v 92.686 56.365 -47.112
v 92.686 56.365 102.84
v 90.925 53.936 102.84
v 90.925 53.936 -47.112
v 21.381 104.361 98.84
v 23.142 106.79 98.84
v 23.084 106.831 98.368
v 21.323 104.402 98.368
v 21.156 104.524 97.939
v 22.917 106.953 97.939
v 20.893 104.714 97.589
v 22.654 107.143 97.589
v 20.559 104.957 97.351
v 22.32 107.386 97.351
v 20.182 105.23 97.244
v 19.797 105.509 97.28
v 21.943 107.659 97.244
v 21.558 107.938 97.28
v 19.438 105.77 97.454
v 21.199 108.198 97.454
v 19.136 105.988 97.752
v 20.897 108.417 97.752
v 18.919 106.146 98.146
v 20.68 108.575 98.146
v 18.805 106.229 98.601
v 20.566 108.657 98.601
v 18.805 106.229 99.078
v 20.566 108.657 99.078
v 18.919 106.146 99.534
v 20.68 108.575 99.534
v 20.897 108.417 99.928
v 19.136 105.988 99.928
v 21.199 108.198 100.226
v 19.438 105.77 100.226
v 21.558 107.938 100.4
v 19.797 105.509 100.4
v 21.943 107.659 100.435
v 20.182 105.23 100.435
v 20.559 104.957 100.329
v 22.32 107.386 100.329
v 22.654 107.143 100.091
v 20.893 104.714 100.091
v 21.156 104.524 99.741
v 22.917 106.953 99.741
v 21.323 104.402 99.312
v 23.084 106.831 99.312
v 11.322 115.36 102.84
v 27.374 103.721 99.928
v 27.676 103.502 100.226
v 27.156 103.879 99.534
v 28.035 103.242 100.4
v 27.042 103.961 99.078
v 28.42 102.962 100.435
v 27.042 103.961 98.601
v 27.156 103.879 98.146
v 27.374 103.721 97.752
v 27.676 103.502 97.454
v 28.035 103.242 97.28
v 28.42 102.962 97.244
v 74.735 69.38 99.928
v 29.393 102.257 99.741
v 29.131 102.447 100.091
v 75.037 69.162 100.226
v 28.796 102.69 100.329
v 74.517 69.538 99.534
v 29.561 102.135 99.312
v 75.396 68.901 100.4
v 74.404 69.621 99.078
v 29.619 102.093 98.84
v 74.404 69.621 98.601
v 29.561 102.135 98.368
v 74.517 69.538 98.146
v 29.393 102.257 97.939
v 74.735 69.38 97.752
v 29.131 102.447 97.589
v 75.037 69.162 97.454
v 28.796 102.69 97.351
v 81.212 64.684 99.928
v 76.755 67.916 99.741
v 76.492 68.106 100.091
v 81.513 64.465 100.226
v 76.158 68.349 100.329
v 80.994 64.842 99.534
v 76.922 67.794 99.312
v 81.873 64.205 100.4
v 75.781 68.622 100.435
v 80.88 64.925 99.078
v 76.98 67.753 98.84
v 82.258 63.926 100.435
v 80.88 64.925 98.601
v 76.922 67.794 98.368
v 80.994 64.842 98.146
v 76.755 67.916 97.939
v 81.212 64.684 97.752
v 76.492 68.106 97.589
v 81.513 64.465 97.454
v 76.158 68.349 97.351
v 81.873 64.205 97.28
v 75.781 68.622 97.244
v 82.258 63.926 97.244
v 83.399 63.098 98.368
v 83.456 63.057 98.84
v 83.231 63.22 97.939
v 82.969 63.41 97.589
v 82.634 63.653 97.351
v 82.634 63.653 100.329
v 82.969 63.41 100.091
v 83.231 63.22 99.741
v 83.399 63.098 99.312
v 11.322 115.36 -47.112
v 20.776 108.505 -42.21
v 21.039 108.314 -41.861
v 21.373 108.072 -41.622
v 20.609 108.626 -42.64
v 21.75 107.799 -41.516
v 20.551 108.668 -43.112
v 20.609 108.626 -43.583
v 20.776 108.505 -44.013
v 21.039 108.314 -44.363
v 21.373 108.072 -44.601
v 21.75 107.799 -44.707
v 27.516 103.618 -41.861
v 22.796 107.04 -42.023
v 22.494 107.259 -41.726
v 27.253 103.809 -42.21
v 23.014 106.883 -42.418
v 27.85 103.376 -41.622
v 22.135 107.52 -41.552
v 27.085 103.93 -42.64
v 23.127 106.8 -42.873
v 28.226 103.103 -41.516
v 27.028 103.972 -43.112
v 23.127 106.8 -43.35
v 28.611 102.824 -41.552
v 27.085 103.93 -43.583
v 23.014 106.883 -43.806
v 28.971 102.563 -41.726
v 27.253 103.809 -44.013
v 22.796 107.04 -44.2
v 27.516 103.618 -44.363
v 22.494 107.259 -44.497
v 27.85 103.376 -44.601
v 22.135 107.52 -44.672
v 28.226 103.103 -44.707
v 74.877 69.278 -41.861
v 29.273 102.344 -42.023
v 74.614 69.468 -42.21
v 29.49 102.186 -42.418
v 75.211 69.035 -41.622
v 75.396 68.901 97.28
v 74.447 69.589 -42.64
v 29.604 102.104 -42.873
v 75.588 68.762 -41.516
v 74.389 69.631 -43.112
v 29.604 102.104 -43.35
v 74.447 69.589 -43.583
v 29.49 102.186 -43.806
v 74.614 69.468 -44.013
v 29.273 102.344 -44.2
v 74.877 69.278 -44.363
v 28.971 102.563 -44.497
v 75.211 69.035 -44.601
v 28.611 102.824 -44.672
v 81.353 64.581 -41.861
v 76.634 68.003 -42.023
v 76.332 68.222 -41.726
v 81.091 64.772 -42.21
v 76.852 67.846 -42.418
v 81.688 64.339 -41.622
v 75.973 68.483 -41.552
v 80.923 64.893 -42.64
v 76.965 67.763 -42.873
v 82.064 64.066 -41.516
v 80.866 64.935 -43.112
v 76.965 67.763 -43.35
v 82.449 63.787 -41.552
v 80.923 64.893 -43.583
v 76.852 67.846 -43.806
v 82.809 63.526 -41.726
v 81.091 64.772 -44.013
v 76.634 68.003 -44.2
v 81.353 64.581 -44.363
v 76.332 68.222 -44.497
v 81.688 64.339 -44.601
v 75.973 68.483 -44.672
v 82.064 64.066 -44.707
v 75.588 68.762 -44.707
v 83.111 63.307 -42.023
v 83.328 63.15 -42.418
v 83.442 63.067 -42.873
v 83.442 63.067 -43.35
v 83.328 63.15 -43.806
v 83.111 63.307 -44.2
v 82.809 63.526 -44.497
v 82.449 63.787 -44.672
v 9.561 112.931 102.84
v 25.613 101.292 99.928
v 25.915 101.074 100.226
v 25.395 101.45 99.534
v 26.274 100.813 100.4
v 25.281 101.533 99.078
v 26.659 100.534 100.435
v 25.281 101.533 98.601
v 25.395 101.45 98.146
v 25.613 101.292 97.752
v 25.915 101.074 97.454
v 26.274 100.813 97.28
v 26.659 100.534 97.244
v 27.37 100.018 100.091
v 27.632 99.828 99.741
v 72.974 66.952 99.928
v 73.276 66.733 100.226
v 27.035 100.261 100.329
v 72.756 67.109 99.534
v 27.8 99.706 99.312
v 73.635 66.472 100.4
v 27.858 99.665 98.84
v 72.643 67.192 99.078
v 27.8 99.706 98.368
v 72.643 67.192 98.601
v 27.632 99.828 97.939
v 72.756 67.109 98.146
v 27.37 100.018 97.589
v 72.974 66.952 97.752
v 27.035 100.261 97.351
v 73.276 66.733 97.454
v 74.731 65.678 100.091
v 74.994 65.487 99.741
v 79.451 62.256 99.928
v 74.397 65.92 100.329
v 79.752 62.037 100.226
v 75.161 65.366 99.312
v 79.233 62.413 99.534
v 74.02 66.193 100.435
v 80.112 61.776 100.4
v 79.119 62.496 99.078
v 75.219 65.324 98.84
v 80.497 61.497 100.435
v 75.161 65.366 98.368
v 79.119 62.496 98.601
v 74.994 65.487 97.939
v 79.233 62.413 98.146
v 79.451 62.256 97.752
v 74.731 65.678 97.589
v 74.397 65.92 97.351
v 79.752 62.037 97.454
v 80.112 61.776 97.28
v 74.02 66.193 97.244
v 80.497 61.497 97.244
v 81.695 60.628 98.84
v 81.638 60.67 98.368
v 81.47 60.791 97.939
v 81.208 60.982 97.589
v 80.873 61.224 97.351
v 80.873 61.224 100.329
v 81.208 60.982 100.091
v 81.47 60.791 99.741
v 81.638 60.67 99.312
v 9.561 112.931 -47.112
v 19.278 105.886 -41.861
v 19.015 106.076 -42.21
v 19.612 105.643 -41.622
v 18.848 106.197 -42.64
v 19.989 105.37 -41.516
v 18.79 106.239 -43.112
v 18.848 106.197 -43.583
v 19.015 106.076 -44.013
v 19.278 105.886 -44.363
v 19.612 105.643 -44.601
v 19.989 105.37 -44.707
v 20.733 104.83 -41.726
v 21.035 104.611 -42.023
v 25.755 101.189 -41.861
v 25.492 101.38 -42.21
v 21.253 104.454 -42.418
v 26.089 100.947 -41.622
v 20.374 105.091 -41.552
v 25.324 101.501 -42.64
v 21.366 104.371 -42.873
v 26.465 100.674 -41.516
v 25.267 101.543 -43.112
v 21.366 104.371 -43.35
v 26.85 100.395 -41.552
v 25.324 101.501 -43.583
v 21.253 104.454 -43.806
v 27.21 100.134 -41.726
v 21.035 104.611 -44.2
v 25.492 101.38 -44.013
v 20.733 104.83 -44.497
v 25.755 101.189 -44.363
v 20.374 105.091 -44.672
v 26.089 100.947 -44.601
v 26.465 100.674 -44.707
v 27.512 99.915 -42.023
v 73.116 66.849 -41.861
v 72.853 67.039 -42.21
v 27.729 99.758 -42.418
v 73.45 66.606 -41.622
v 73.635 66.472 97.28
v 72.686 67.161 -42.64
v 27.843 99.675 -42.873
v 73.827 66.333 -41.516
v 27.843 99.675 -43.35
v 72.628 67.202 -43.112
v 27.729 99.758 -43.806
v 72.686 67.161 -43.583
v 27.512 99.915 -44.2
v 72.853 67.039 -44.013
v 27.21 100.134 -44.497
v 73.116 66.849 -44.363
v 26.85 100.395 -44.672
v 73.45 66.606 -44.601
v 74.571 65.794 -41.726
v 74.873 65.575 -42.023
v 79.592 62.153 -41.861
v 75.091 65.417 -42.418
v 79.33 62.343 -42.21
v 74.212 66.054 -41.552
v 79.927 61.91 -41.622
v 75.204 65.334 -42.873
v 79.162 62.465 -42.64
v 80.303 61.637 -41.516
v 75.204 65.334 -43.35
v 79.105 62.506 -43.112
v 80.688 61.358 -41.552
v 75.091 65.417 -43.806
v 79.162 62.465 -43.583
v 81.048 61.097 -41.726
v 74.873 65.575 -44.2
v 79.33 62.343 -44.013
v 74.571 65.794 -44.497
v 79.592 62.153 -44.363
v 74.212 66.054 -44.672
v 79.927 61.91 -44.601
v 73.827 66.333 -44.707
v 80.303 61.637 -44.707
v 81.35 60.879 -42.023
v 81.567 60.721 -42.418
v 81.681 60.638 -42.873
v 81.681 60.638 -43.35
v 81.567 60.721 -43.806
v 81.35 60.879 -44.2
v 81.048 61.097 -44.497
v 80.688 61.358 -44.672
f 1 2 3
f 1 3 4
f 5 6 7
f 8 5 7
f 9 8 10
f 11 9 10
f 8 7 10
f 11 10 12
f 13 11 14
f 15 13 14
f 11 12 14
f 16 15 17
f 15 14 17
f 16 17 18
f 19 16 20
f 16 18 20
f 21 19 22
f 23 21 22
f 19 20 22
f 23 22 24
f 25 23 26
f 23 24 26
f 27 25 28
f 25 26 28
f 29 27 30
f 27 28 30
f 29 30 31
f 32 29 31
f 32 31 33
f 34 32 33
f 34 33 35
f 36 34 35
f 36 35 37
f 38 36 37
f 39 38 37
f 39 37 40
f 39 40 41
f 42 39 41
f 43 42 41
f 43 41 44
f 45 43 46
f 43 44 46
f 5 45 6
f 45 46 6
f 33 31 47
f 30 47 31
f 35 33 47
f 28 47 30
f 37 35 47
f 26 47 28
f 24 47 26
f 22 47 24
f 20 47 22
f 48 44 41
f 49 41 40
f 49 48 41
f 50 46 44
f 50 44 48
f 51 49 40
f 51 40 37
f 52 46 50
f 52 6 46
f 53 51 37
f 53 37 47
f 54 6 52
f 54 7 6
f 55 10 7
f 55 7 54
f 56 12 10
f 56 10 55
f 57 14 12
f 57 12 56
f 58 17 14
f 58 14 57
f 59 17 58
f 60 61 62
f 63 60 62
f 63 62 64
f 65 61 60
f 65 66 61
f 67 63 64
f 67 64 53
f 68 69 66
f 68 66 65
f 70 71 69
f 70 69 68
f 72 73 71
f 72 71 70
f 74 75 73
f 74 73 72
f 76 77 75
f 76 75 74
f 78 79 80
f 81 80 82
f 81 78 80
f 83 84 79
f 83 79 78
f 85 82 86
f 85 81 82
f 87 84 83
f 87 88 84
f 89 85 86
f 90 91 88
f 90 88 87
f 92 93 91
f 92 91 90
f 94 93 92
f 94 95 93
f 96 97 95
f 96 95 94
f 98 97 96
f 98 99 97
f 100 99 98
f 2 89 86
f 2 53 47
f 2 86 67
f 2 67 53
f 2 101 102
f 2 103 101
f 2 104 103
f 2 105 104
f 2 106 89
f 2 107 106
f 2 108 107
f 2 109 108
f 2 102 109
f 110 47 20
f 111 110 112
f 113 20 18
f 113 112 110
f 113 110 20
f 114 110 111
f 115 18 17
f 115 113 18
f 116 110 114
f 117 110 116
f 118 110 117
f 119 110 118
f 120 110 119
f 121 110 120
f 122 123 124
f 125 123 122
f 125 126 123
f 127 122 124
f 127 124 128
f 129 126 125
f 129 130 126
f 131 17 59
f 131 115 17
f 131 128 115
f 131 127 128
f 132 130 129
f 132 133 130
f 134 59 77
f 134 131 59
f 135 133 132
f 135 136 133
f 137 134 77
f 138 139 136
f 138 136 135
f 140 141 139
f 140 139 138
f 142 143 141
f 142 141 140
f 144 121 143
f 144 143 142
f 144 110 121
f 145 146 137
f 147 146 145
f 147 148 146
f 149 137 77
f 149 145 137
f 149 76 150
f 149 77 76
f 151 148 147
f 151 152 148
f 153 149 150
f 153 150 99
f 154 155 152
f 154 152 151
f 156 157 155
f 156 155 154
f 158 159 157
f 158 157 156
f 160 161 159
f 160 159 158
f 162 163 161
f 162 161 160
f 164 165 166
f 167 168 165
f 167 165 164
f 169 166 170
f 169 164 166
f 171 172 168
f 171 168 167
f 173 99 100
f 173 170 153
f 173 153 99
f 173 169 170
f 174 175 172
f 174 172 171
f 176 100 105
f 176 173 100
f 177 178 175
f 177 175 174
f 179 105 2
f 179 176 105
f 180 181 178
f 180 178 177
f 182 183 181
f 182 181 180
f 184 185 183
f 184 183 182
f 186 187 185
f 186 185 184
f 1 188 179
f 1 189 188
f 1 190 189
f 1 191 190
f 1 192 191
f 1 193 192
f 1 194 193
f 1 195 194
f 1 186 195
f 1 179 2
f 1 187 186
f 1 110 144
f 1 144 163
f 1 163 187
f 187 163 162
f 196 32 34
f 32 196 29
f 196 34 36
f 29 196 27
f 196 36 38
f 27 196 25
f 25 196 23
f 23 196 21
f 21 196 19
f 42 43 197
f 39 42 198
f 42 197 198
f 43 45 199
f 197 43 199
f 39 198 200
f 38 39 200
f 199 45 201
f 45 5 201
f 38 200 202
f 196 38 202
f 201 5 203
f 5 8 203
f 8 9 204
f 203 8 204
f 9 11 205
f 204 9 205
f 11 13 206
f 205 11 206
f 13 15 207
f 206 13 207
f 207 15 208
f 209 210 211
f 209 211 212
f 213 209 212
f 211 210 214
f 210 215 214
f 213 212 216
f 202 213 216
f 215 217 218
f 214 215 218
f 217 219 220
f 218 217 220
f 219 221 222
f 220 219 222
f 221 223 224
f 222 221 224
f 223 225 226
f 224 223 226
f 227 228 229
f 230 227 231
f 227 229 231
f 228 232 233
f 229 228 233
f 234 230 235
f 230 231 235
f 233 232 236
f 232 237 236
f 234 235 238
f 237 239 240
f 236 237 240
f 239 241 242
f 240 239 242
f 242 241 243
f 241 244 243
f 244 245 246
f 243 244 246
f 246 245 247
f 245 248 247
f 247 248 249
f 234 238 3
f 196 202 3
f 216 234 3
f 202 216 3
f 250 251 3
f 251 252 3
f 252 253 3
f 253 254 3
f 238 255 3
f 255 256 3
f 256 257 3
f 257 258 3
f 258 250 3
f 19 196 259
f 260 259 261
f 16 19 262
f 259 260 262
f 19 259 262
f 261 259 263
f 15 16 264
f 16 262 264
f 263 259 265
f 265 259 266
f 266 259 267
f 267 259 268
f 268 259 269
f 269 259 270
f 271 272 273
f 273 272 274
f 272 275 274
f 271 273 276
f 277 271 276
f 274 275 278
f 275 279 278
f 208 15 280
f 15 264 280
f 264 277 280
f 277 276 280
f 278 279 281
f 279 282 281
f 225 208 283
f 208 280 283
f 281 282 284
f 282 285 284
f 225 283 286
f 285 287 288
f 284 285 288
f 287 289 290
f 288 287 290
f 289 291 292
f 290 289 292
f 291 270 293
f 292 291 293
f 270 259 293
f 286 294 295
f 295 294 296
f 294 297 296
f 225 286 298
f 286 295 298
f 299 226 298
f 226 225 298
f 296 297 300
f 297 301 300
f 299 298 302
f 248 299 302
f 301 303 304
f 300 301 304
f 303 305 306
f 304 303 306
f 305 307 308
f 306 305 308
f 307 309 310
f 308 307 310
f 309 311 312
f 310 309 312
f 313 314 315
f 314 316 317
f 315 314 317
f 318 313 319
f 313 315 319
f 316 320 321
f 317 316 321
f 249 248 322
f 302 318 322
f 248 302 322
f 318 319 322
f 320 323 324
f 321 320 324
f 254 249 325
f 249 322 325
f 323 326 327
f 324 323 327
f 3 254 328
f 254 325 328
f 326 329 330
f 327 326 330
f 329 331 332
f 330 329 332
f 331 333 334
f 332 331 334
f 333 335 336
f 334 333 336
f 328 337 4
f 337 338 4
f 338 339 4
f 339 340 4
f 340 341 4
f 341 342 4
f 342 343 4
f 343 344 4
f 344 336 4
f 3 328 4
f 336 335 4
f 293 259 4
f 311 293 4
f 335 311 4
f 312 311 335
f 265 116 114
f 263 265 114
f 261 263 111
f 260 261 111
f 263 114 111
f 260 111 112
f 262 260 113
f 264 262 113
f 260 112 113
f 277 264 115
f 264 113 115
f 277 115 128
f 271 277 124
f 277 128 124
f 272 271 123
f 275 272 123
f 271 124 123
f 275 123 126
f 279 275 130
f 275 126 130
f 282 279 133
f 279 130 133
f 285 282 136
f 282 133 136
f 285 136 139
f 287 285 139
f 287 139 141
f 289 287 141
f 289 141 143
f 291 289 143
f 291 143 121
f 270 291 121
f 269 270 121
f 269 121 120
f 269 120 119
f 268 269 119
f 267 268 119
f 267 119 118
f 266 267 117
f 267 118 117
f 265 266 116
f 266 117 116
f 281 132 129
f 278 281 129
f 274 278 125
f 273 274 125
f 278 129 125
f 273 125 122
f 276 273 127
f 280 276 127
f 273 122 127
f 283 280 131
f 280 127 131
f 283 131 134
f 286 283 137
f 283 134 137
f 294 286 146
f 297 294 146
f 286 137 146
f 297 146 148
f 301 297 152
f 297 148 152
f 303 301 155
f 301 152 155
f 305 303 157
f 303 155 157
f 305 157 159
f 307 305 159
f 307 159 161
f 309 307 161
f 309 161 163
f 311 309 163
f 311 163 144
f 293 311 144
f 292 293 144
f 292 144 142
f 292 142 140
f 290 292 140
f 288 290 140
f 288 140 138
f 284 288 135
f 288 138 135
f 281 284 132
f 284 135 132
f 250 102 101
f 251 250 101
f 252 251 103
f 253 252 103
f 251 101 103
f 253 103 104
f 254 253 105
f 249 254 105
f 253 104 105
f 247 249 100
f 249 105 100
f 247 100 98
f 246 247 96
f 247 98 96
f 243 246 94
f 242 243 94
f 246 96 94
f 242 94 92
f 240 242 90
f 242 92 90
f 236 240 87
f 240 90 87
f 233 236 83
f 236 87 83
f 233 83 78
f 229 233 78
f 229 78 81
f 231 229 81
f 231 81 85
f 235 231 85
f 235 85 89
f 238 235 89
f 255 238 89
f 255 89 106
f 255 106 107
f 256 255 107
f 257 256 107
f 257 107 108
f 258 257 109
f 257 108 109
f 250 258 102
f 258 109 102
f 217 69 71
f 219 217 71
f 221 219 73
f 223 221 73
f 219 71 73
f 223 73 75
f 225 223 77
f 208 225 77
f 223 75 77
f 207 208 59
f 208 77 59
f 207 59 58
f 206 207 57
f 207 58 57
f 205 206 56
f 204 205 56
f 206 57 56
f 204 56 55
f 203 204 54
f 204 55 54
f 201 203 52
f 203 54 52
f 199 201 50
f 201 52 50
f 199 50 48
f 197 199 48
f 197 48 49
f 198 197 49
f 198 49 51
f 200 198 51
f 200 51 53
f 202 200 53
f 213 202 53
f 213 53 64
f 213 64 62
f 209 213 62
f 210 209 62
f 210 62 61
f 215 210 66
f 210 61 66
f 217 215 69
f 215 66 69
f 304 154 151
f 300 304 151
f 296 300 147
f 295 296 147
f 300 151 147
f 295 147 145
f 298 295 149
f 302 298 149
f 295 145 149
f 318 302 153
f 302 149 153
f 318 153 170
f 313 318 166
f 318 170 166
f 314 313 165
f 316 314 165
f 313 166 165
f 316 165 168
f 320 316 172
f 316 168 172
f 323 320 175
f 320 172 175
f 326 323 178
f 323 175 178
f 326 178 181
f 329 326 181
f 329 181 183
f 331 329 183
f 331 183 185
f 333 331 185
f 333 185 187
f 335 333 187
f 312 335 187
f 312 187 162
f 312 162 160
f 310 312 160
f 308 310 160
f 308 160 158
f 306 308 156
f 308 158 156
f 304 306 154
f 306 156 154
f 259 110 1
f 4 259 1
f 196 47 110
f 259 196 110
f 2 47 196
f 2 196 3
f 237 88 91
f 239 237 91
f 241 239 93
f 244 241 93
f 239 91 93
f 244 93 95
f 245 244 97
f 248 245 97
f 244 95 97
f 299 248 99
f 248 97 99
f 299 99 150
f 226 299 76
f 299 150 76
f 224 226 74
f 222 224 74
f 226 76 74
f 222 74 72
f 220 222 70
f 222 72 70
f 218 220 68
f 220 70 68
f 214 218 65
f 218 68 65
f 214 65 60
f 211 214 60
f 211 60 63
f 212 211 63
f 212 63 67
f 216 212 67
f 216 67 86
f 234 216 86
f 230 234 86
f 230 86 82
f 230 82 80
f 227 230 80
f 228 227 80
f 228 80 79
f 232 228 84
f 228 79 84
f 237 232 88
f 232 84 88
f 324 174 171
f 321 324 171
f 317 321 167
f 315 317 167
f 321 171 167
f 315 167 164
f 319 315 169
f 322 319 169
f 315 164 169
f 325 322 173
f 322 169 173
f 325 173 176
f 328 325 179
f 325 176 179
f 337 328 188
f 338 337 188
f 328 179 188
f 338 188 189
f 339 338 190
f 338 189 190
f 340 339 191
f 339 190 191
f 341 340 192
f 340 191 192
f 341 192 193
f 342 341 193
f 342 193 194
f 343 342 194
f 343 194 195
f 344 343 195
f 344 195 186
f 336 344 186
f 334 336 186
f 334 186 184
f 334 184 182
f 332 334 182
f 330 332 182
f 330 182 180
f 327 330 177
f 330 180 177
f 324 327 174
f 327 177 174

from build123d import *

# Parameters (mm, degrees)
SKETCH_2_W      = 100.501056251
SKETCH_2_H      = 149.951645819
SKETCH_2_R      = 1.6
EXTRUDE_1_DEPTH = 3


with BuildPart() as part:
    # 草图2 → 凸台-拉伸1 (new body)
    with BuildSketch(Plane(origin=(58.724000156, 80.989637793, 0), x_dir=(0.8095795047809408, -0.5870102430440604, 0), z_dir=(0.5870102430440604, 0.8095795047809408, 0))):
        with Locations((-8.300782896, -27.864106314)):
            Rectangle(SKETCH_2_W, SKETCH_2_H)
        with Locations(Location((-45.551311022, 43.111716595, 0), (0, 0, 180))):
            Circle(SKETCH_2_R, mode=Mode.SUBTRACT)
        with Locations(Location((-37.551311022, 43.111716595, 0), (0, 0, 180))):
            Circle(SKETCH_2_R, mode=Mode.SUBTRACT)
        with Locations(Location((20.949745229, 43.111716595, 0), (0, 0, 180))):
            Circle(SKETCH_2_R, mode=Mode.SUBTRACT)
        with Locations(Location((28.949745229, 43.111716595, 0), (0, 0, 180))):
            Circle(SKETCH_2_R, mode=Mode.SUBTRACT)
        with Locations((28.949745229, -98.839929224)):
            Circle(SKETCH_2_R, mode=Mode.SUBTRACT)
        with Locations((20.949745229, -98.839929224)):
            Circle(SKETCH_2_R, mode=Mode.SUBTRACT)
        with Locations((-37.551311022, -98.839929224)):
            Circle(SKETCH_2_R, mode=Mode.SUBTRACT)
        with Locations((-45.551311022, -98.839929224)):
            Circle(SKETCH_2_R, mode=Mode.SUBTRACT)
    extrude(amount=-EXTRUDE_1_DEPTH)


solid = part.part
